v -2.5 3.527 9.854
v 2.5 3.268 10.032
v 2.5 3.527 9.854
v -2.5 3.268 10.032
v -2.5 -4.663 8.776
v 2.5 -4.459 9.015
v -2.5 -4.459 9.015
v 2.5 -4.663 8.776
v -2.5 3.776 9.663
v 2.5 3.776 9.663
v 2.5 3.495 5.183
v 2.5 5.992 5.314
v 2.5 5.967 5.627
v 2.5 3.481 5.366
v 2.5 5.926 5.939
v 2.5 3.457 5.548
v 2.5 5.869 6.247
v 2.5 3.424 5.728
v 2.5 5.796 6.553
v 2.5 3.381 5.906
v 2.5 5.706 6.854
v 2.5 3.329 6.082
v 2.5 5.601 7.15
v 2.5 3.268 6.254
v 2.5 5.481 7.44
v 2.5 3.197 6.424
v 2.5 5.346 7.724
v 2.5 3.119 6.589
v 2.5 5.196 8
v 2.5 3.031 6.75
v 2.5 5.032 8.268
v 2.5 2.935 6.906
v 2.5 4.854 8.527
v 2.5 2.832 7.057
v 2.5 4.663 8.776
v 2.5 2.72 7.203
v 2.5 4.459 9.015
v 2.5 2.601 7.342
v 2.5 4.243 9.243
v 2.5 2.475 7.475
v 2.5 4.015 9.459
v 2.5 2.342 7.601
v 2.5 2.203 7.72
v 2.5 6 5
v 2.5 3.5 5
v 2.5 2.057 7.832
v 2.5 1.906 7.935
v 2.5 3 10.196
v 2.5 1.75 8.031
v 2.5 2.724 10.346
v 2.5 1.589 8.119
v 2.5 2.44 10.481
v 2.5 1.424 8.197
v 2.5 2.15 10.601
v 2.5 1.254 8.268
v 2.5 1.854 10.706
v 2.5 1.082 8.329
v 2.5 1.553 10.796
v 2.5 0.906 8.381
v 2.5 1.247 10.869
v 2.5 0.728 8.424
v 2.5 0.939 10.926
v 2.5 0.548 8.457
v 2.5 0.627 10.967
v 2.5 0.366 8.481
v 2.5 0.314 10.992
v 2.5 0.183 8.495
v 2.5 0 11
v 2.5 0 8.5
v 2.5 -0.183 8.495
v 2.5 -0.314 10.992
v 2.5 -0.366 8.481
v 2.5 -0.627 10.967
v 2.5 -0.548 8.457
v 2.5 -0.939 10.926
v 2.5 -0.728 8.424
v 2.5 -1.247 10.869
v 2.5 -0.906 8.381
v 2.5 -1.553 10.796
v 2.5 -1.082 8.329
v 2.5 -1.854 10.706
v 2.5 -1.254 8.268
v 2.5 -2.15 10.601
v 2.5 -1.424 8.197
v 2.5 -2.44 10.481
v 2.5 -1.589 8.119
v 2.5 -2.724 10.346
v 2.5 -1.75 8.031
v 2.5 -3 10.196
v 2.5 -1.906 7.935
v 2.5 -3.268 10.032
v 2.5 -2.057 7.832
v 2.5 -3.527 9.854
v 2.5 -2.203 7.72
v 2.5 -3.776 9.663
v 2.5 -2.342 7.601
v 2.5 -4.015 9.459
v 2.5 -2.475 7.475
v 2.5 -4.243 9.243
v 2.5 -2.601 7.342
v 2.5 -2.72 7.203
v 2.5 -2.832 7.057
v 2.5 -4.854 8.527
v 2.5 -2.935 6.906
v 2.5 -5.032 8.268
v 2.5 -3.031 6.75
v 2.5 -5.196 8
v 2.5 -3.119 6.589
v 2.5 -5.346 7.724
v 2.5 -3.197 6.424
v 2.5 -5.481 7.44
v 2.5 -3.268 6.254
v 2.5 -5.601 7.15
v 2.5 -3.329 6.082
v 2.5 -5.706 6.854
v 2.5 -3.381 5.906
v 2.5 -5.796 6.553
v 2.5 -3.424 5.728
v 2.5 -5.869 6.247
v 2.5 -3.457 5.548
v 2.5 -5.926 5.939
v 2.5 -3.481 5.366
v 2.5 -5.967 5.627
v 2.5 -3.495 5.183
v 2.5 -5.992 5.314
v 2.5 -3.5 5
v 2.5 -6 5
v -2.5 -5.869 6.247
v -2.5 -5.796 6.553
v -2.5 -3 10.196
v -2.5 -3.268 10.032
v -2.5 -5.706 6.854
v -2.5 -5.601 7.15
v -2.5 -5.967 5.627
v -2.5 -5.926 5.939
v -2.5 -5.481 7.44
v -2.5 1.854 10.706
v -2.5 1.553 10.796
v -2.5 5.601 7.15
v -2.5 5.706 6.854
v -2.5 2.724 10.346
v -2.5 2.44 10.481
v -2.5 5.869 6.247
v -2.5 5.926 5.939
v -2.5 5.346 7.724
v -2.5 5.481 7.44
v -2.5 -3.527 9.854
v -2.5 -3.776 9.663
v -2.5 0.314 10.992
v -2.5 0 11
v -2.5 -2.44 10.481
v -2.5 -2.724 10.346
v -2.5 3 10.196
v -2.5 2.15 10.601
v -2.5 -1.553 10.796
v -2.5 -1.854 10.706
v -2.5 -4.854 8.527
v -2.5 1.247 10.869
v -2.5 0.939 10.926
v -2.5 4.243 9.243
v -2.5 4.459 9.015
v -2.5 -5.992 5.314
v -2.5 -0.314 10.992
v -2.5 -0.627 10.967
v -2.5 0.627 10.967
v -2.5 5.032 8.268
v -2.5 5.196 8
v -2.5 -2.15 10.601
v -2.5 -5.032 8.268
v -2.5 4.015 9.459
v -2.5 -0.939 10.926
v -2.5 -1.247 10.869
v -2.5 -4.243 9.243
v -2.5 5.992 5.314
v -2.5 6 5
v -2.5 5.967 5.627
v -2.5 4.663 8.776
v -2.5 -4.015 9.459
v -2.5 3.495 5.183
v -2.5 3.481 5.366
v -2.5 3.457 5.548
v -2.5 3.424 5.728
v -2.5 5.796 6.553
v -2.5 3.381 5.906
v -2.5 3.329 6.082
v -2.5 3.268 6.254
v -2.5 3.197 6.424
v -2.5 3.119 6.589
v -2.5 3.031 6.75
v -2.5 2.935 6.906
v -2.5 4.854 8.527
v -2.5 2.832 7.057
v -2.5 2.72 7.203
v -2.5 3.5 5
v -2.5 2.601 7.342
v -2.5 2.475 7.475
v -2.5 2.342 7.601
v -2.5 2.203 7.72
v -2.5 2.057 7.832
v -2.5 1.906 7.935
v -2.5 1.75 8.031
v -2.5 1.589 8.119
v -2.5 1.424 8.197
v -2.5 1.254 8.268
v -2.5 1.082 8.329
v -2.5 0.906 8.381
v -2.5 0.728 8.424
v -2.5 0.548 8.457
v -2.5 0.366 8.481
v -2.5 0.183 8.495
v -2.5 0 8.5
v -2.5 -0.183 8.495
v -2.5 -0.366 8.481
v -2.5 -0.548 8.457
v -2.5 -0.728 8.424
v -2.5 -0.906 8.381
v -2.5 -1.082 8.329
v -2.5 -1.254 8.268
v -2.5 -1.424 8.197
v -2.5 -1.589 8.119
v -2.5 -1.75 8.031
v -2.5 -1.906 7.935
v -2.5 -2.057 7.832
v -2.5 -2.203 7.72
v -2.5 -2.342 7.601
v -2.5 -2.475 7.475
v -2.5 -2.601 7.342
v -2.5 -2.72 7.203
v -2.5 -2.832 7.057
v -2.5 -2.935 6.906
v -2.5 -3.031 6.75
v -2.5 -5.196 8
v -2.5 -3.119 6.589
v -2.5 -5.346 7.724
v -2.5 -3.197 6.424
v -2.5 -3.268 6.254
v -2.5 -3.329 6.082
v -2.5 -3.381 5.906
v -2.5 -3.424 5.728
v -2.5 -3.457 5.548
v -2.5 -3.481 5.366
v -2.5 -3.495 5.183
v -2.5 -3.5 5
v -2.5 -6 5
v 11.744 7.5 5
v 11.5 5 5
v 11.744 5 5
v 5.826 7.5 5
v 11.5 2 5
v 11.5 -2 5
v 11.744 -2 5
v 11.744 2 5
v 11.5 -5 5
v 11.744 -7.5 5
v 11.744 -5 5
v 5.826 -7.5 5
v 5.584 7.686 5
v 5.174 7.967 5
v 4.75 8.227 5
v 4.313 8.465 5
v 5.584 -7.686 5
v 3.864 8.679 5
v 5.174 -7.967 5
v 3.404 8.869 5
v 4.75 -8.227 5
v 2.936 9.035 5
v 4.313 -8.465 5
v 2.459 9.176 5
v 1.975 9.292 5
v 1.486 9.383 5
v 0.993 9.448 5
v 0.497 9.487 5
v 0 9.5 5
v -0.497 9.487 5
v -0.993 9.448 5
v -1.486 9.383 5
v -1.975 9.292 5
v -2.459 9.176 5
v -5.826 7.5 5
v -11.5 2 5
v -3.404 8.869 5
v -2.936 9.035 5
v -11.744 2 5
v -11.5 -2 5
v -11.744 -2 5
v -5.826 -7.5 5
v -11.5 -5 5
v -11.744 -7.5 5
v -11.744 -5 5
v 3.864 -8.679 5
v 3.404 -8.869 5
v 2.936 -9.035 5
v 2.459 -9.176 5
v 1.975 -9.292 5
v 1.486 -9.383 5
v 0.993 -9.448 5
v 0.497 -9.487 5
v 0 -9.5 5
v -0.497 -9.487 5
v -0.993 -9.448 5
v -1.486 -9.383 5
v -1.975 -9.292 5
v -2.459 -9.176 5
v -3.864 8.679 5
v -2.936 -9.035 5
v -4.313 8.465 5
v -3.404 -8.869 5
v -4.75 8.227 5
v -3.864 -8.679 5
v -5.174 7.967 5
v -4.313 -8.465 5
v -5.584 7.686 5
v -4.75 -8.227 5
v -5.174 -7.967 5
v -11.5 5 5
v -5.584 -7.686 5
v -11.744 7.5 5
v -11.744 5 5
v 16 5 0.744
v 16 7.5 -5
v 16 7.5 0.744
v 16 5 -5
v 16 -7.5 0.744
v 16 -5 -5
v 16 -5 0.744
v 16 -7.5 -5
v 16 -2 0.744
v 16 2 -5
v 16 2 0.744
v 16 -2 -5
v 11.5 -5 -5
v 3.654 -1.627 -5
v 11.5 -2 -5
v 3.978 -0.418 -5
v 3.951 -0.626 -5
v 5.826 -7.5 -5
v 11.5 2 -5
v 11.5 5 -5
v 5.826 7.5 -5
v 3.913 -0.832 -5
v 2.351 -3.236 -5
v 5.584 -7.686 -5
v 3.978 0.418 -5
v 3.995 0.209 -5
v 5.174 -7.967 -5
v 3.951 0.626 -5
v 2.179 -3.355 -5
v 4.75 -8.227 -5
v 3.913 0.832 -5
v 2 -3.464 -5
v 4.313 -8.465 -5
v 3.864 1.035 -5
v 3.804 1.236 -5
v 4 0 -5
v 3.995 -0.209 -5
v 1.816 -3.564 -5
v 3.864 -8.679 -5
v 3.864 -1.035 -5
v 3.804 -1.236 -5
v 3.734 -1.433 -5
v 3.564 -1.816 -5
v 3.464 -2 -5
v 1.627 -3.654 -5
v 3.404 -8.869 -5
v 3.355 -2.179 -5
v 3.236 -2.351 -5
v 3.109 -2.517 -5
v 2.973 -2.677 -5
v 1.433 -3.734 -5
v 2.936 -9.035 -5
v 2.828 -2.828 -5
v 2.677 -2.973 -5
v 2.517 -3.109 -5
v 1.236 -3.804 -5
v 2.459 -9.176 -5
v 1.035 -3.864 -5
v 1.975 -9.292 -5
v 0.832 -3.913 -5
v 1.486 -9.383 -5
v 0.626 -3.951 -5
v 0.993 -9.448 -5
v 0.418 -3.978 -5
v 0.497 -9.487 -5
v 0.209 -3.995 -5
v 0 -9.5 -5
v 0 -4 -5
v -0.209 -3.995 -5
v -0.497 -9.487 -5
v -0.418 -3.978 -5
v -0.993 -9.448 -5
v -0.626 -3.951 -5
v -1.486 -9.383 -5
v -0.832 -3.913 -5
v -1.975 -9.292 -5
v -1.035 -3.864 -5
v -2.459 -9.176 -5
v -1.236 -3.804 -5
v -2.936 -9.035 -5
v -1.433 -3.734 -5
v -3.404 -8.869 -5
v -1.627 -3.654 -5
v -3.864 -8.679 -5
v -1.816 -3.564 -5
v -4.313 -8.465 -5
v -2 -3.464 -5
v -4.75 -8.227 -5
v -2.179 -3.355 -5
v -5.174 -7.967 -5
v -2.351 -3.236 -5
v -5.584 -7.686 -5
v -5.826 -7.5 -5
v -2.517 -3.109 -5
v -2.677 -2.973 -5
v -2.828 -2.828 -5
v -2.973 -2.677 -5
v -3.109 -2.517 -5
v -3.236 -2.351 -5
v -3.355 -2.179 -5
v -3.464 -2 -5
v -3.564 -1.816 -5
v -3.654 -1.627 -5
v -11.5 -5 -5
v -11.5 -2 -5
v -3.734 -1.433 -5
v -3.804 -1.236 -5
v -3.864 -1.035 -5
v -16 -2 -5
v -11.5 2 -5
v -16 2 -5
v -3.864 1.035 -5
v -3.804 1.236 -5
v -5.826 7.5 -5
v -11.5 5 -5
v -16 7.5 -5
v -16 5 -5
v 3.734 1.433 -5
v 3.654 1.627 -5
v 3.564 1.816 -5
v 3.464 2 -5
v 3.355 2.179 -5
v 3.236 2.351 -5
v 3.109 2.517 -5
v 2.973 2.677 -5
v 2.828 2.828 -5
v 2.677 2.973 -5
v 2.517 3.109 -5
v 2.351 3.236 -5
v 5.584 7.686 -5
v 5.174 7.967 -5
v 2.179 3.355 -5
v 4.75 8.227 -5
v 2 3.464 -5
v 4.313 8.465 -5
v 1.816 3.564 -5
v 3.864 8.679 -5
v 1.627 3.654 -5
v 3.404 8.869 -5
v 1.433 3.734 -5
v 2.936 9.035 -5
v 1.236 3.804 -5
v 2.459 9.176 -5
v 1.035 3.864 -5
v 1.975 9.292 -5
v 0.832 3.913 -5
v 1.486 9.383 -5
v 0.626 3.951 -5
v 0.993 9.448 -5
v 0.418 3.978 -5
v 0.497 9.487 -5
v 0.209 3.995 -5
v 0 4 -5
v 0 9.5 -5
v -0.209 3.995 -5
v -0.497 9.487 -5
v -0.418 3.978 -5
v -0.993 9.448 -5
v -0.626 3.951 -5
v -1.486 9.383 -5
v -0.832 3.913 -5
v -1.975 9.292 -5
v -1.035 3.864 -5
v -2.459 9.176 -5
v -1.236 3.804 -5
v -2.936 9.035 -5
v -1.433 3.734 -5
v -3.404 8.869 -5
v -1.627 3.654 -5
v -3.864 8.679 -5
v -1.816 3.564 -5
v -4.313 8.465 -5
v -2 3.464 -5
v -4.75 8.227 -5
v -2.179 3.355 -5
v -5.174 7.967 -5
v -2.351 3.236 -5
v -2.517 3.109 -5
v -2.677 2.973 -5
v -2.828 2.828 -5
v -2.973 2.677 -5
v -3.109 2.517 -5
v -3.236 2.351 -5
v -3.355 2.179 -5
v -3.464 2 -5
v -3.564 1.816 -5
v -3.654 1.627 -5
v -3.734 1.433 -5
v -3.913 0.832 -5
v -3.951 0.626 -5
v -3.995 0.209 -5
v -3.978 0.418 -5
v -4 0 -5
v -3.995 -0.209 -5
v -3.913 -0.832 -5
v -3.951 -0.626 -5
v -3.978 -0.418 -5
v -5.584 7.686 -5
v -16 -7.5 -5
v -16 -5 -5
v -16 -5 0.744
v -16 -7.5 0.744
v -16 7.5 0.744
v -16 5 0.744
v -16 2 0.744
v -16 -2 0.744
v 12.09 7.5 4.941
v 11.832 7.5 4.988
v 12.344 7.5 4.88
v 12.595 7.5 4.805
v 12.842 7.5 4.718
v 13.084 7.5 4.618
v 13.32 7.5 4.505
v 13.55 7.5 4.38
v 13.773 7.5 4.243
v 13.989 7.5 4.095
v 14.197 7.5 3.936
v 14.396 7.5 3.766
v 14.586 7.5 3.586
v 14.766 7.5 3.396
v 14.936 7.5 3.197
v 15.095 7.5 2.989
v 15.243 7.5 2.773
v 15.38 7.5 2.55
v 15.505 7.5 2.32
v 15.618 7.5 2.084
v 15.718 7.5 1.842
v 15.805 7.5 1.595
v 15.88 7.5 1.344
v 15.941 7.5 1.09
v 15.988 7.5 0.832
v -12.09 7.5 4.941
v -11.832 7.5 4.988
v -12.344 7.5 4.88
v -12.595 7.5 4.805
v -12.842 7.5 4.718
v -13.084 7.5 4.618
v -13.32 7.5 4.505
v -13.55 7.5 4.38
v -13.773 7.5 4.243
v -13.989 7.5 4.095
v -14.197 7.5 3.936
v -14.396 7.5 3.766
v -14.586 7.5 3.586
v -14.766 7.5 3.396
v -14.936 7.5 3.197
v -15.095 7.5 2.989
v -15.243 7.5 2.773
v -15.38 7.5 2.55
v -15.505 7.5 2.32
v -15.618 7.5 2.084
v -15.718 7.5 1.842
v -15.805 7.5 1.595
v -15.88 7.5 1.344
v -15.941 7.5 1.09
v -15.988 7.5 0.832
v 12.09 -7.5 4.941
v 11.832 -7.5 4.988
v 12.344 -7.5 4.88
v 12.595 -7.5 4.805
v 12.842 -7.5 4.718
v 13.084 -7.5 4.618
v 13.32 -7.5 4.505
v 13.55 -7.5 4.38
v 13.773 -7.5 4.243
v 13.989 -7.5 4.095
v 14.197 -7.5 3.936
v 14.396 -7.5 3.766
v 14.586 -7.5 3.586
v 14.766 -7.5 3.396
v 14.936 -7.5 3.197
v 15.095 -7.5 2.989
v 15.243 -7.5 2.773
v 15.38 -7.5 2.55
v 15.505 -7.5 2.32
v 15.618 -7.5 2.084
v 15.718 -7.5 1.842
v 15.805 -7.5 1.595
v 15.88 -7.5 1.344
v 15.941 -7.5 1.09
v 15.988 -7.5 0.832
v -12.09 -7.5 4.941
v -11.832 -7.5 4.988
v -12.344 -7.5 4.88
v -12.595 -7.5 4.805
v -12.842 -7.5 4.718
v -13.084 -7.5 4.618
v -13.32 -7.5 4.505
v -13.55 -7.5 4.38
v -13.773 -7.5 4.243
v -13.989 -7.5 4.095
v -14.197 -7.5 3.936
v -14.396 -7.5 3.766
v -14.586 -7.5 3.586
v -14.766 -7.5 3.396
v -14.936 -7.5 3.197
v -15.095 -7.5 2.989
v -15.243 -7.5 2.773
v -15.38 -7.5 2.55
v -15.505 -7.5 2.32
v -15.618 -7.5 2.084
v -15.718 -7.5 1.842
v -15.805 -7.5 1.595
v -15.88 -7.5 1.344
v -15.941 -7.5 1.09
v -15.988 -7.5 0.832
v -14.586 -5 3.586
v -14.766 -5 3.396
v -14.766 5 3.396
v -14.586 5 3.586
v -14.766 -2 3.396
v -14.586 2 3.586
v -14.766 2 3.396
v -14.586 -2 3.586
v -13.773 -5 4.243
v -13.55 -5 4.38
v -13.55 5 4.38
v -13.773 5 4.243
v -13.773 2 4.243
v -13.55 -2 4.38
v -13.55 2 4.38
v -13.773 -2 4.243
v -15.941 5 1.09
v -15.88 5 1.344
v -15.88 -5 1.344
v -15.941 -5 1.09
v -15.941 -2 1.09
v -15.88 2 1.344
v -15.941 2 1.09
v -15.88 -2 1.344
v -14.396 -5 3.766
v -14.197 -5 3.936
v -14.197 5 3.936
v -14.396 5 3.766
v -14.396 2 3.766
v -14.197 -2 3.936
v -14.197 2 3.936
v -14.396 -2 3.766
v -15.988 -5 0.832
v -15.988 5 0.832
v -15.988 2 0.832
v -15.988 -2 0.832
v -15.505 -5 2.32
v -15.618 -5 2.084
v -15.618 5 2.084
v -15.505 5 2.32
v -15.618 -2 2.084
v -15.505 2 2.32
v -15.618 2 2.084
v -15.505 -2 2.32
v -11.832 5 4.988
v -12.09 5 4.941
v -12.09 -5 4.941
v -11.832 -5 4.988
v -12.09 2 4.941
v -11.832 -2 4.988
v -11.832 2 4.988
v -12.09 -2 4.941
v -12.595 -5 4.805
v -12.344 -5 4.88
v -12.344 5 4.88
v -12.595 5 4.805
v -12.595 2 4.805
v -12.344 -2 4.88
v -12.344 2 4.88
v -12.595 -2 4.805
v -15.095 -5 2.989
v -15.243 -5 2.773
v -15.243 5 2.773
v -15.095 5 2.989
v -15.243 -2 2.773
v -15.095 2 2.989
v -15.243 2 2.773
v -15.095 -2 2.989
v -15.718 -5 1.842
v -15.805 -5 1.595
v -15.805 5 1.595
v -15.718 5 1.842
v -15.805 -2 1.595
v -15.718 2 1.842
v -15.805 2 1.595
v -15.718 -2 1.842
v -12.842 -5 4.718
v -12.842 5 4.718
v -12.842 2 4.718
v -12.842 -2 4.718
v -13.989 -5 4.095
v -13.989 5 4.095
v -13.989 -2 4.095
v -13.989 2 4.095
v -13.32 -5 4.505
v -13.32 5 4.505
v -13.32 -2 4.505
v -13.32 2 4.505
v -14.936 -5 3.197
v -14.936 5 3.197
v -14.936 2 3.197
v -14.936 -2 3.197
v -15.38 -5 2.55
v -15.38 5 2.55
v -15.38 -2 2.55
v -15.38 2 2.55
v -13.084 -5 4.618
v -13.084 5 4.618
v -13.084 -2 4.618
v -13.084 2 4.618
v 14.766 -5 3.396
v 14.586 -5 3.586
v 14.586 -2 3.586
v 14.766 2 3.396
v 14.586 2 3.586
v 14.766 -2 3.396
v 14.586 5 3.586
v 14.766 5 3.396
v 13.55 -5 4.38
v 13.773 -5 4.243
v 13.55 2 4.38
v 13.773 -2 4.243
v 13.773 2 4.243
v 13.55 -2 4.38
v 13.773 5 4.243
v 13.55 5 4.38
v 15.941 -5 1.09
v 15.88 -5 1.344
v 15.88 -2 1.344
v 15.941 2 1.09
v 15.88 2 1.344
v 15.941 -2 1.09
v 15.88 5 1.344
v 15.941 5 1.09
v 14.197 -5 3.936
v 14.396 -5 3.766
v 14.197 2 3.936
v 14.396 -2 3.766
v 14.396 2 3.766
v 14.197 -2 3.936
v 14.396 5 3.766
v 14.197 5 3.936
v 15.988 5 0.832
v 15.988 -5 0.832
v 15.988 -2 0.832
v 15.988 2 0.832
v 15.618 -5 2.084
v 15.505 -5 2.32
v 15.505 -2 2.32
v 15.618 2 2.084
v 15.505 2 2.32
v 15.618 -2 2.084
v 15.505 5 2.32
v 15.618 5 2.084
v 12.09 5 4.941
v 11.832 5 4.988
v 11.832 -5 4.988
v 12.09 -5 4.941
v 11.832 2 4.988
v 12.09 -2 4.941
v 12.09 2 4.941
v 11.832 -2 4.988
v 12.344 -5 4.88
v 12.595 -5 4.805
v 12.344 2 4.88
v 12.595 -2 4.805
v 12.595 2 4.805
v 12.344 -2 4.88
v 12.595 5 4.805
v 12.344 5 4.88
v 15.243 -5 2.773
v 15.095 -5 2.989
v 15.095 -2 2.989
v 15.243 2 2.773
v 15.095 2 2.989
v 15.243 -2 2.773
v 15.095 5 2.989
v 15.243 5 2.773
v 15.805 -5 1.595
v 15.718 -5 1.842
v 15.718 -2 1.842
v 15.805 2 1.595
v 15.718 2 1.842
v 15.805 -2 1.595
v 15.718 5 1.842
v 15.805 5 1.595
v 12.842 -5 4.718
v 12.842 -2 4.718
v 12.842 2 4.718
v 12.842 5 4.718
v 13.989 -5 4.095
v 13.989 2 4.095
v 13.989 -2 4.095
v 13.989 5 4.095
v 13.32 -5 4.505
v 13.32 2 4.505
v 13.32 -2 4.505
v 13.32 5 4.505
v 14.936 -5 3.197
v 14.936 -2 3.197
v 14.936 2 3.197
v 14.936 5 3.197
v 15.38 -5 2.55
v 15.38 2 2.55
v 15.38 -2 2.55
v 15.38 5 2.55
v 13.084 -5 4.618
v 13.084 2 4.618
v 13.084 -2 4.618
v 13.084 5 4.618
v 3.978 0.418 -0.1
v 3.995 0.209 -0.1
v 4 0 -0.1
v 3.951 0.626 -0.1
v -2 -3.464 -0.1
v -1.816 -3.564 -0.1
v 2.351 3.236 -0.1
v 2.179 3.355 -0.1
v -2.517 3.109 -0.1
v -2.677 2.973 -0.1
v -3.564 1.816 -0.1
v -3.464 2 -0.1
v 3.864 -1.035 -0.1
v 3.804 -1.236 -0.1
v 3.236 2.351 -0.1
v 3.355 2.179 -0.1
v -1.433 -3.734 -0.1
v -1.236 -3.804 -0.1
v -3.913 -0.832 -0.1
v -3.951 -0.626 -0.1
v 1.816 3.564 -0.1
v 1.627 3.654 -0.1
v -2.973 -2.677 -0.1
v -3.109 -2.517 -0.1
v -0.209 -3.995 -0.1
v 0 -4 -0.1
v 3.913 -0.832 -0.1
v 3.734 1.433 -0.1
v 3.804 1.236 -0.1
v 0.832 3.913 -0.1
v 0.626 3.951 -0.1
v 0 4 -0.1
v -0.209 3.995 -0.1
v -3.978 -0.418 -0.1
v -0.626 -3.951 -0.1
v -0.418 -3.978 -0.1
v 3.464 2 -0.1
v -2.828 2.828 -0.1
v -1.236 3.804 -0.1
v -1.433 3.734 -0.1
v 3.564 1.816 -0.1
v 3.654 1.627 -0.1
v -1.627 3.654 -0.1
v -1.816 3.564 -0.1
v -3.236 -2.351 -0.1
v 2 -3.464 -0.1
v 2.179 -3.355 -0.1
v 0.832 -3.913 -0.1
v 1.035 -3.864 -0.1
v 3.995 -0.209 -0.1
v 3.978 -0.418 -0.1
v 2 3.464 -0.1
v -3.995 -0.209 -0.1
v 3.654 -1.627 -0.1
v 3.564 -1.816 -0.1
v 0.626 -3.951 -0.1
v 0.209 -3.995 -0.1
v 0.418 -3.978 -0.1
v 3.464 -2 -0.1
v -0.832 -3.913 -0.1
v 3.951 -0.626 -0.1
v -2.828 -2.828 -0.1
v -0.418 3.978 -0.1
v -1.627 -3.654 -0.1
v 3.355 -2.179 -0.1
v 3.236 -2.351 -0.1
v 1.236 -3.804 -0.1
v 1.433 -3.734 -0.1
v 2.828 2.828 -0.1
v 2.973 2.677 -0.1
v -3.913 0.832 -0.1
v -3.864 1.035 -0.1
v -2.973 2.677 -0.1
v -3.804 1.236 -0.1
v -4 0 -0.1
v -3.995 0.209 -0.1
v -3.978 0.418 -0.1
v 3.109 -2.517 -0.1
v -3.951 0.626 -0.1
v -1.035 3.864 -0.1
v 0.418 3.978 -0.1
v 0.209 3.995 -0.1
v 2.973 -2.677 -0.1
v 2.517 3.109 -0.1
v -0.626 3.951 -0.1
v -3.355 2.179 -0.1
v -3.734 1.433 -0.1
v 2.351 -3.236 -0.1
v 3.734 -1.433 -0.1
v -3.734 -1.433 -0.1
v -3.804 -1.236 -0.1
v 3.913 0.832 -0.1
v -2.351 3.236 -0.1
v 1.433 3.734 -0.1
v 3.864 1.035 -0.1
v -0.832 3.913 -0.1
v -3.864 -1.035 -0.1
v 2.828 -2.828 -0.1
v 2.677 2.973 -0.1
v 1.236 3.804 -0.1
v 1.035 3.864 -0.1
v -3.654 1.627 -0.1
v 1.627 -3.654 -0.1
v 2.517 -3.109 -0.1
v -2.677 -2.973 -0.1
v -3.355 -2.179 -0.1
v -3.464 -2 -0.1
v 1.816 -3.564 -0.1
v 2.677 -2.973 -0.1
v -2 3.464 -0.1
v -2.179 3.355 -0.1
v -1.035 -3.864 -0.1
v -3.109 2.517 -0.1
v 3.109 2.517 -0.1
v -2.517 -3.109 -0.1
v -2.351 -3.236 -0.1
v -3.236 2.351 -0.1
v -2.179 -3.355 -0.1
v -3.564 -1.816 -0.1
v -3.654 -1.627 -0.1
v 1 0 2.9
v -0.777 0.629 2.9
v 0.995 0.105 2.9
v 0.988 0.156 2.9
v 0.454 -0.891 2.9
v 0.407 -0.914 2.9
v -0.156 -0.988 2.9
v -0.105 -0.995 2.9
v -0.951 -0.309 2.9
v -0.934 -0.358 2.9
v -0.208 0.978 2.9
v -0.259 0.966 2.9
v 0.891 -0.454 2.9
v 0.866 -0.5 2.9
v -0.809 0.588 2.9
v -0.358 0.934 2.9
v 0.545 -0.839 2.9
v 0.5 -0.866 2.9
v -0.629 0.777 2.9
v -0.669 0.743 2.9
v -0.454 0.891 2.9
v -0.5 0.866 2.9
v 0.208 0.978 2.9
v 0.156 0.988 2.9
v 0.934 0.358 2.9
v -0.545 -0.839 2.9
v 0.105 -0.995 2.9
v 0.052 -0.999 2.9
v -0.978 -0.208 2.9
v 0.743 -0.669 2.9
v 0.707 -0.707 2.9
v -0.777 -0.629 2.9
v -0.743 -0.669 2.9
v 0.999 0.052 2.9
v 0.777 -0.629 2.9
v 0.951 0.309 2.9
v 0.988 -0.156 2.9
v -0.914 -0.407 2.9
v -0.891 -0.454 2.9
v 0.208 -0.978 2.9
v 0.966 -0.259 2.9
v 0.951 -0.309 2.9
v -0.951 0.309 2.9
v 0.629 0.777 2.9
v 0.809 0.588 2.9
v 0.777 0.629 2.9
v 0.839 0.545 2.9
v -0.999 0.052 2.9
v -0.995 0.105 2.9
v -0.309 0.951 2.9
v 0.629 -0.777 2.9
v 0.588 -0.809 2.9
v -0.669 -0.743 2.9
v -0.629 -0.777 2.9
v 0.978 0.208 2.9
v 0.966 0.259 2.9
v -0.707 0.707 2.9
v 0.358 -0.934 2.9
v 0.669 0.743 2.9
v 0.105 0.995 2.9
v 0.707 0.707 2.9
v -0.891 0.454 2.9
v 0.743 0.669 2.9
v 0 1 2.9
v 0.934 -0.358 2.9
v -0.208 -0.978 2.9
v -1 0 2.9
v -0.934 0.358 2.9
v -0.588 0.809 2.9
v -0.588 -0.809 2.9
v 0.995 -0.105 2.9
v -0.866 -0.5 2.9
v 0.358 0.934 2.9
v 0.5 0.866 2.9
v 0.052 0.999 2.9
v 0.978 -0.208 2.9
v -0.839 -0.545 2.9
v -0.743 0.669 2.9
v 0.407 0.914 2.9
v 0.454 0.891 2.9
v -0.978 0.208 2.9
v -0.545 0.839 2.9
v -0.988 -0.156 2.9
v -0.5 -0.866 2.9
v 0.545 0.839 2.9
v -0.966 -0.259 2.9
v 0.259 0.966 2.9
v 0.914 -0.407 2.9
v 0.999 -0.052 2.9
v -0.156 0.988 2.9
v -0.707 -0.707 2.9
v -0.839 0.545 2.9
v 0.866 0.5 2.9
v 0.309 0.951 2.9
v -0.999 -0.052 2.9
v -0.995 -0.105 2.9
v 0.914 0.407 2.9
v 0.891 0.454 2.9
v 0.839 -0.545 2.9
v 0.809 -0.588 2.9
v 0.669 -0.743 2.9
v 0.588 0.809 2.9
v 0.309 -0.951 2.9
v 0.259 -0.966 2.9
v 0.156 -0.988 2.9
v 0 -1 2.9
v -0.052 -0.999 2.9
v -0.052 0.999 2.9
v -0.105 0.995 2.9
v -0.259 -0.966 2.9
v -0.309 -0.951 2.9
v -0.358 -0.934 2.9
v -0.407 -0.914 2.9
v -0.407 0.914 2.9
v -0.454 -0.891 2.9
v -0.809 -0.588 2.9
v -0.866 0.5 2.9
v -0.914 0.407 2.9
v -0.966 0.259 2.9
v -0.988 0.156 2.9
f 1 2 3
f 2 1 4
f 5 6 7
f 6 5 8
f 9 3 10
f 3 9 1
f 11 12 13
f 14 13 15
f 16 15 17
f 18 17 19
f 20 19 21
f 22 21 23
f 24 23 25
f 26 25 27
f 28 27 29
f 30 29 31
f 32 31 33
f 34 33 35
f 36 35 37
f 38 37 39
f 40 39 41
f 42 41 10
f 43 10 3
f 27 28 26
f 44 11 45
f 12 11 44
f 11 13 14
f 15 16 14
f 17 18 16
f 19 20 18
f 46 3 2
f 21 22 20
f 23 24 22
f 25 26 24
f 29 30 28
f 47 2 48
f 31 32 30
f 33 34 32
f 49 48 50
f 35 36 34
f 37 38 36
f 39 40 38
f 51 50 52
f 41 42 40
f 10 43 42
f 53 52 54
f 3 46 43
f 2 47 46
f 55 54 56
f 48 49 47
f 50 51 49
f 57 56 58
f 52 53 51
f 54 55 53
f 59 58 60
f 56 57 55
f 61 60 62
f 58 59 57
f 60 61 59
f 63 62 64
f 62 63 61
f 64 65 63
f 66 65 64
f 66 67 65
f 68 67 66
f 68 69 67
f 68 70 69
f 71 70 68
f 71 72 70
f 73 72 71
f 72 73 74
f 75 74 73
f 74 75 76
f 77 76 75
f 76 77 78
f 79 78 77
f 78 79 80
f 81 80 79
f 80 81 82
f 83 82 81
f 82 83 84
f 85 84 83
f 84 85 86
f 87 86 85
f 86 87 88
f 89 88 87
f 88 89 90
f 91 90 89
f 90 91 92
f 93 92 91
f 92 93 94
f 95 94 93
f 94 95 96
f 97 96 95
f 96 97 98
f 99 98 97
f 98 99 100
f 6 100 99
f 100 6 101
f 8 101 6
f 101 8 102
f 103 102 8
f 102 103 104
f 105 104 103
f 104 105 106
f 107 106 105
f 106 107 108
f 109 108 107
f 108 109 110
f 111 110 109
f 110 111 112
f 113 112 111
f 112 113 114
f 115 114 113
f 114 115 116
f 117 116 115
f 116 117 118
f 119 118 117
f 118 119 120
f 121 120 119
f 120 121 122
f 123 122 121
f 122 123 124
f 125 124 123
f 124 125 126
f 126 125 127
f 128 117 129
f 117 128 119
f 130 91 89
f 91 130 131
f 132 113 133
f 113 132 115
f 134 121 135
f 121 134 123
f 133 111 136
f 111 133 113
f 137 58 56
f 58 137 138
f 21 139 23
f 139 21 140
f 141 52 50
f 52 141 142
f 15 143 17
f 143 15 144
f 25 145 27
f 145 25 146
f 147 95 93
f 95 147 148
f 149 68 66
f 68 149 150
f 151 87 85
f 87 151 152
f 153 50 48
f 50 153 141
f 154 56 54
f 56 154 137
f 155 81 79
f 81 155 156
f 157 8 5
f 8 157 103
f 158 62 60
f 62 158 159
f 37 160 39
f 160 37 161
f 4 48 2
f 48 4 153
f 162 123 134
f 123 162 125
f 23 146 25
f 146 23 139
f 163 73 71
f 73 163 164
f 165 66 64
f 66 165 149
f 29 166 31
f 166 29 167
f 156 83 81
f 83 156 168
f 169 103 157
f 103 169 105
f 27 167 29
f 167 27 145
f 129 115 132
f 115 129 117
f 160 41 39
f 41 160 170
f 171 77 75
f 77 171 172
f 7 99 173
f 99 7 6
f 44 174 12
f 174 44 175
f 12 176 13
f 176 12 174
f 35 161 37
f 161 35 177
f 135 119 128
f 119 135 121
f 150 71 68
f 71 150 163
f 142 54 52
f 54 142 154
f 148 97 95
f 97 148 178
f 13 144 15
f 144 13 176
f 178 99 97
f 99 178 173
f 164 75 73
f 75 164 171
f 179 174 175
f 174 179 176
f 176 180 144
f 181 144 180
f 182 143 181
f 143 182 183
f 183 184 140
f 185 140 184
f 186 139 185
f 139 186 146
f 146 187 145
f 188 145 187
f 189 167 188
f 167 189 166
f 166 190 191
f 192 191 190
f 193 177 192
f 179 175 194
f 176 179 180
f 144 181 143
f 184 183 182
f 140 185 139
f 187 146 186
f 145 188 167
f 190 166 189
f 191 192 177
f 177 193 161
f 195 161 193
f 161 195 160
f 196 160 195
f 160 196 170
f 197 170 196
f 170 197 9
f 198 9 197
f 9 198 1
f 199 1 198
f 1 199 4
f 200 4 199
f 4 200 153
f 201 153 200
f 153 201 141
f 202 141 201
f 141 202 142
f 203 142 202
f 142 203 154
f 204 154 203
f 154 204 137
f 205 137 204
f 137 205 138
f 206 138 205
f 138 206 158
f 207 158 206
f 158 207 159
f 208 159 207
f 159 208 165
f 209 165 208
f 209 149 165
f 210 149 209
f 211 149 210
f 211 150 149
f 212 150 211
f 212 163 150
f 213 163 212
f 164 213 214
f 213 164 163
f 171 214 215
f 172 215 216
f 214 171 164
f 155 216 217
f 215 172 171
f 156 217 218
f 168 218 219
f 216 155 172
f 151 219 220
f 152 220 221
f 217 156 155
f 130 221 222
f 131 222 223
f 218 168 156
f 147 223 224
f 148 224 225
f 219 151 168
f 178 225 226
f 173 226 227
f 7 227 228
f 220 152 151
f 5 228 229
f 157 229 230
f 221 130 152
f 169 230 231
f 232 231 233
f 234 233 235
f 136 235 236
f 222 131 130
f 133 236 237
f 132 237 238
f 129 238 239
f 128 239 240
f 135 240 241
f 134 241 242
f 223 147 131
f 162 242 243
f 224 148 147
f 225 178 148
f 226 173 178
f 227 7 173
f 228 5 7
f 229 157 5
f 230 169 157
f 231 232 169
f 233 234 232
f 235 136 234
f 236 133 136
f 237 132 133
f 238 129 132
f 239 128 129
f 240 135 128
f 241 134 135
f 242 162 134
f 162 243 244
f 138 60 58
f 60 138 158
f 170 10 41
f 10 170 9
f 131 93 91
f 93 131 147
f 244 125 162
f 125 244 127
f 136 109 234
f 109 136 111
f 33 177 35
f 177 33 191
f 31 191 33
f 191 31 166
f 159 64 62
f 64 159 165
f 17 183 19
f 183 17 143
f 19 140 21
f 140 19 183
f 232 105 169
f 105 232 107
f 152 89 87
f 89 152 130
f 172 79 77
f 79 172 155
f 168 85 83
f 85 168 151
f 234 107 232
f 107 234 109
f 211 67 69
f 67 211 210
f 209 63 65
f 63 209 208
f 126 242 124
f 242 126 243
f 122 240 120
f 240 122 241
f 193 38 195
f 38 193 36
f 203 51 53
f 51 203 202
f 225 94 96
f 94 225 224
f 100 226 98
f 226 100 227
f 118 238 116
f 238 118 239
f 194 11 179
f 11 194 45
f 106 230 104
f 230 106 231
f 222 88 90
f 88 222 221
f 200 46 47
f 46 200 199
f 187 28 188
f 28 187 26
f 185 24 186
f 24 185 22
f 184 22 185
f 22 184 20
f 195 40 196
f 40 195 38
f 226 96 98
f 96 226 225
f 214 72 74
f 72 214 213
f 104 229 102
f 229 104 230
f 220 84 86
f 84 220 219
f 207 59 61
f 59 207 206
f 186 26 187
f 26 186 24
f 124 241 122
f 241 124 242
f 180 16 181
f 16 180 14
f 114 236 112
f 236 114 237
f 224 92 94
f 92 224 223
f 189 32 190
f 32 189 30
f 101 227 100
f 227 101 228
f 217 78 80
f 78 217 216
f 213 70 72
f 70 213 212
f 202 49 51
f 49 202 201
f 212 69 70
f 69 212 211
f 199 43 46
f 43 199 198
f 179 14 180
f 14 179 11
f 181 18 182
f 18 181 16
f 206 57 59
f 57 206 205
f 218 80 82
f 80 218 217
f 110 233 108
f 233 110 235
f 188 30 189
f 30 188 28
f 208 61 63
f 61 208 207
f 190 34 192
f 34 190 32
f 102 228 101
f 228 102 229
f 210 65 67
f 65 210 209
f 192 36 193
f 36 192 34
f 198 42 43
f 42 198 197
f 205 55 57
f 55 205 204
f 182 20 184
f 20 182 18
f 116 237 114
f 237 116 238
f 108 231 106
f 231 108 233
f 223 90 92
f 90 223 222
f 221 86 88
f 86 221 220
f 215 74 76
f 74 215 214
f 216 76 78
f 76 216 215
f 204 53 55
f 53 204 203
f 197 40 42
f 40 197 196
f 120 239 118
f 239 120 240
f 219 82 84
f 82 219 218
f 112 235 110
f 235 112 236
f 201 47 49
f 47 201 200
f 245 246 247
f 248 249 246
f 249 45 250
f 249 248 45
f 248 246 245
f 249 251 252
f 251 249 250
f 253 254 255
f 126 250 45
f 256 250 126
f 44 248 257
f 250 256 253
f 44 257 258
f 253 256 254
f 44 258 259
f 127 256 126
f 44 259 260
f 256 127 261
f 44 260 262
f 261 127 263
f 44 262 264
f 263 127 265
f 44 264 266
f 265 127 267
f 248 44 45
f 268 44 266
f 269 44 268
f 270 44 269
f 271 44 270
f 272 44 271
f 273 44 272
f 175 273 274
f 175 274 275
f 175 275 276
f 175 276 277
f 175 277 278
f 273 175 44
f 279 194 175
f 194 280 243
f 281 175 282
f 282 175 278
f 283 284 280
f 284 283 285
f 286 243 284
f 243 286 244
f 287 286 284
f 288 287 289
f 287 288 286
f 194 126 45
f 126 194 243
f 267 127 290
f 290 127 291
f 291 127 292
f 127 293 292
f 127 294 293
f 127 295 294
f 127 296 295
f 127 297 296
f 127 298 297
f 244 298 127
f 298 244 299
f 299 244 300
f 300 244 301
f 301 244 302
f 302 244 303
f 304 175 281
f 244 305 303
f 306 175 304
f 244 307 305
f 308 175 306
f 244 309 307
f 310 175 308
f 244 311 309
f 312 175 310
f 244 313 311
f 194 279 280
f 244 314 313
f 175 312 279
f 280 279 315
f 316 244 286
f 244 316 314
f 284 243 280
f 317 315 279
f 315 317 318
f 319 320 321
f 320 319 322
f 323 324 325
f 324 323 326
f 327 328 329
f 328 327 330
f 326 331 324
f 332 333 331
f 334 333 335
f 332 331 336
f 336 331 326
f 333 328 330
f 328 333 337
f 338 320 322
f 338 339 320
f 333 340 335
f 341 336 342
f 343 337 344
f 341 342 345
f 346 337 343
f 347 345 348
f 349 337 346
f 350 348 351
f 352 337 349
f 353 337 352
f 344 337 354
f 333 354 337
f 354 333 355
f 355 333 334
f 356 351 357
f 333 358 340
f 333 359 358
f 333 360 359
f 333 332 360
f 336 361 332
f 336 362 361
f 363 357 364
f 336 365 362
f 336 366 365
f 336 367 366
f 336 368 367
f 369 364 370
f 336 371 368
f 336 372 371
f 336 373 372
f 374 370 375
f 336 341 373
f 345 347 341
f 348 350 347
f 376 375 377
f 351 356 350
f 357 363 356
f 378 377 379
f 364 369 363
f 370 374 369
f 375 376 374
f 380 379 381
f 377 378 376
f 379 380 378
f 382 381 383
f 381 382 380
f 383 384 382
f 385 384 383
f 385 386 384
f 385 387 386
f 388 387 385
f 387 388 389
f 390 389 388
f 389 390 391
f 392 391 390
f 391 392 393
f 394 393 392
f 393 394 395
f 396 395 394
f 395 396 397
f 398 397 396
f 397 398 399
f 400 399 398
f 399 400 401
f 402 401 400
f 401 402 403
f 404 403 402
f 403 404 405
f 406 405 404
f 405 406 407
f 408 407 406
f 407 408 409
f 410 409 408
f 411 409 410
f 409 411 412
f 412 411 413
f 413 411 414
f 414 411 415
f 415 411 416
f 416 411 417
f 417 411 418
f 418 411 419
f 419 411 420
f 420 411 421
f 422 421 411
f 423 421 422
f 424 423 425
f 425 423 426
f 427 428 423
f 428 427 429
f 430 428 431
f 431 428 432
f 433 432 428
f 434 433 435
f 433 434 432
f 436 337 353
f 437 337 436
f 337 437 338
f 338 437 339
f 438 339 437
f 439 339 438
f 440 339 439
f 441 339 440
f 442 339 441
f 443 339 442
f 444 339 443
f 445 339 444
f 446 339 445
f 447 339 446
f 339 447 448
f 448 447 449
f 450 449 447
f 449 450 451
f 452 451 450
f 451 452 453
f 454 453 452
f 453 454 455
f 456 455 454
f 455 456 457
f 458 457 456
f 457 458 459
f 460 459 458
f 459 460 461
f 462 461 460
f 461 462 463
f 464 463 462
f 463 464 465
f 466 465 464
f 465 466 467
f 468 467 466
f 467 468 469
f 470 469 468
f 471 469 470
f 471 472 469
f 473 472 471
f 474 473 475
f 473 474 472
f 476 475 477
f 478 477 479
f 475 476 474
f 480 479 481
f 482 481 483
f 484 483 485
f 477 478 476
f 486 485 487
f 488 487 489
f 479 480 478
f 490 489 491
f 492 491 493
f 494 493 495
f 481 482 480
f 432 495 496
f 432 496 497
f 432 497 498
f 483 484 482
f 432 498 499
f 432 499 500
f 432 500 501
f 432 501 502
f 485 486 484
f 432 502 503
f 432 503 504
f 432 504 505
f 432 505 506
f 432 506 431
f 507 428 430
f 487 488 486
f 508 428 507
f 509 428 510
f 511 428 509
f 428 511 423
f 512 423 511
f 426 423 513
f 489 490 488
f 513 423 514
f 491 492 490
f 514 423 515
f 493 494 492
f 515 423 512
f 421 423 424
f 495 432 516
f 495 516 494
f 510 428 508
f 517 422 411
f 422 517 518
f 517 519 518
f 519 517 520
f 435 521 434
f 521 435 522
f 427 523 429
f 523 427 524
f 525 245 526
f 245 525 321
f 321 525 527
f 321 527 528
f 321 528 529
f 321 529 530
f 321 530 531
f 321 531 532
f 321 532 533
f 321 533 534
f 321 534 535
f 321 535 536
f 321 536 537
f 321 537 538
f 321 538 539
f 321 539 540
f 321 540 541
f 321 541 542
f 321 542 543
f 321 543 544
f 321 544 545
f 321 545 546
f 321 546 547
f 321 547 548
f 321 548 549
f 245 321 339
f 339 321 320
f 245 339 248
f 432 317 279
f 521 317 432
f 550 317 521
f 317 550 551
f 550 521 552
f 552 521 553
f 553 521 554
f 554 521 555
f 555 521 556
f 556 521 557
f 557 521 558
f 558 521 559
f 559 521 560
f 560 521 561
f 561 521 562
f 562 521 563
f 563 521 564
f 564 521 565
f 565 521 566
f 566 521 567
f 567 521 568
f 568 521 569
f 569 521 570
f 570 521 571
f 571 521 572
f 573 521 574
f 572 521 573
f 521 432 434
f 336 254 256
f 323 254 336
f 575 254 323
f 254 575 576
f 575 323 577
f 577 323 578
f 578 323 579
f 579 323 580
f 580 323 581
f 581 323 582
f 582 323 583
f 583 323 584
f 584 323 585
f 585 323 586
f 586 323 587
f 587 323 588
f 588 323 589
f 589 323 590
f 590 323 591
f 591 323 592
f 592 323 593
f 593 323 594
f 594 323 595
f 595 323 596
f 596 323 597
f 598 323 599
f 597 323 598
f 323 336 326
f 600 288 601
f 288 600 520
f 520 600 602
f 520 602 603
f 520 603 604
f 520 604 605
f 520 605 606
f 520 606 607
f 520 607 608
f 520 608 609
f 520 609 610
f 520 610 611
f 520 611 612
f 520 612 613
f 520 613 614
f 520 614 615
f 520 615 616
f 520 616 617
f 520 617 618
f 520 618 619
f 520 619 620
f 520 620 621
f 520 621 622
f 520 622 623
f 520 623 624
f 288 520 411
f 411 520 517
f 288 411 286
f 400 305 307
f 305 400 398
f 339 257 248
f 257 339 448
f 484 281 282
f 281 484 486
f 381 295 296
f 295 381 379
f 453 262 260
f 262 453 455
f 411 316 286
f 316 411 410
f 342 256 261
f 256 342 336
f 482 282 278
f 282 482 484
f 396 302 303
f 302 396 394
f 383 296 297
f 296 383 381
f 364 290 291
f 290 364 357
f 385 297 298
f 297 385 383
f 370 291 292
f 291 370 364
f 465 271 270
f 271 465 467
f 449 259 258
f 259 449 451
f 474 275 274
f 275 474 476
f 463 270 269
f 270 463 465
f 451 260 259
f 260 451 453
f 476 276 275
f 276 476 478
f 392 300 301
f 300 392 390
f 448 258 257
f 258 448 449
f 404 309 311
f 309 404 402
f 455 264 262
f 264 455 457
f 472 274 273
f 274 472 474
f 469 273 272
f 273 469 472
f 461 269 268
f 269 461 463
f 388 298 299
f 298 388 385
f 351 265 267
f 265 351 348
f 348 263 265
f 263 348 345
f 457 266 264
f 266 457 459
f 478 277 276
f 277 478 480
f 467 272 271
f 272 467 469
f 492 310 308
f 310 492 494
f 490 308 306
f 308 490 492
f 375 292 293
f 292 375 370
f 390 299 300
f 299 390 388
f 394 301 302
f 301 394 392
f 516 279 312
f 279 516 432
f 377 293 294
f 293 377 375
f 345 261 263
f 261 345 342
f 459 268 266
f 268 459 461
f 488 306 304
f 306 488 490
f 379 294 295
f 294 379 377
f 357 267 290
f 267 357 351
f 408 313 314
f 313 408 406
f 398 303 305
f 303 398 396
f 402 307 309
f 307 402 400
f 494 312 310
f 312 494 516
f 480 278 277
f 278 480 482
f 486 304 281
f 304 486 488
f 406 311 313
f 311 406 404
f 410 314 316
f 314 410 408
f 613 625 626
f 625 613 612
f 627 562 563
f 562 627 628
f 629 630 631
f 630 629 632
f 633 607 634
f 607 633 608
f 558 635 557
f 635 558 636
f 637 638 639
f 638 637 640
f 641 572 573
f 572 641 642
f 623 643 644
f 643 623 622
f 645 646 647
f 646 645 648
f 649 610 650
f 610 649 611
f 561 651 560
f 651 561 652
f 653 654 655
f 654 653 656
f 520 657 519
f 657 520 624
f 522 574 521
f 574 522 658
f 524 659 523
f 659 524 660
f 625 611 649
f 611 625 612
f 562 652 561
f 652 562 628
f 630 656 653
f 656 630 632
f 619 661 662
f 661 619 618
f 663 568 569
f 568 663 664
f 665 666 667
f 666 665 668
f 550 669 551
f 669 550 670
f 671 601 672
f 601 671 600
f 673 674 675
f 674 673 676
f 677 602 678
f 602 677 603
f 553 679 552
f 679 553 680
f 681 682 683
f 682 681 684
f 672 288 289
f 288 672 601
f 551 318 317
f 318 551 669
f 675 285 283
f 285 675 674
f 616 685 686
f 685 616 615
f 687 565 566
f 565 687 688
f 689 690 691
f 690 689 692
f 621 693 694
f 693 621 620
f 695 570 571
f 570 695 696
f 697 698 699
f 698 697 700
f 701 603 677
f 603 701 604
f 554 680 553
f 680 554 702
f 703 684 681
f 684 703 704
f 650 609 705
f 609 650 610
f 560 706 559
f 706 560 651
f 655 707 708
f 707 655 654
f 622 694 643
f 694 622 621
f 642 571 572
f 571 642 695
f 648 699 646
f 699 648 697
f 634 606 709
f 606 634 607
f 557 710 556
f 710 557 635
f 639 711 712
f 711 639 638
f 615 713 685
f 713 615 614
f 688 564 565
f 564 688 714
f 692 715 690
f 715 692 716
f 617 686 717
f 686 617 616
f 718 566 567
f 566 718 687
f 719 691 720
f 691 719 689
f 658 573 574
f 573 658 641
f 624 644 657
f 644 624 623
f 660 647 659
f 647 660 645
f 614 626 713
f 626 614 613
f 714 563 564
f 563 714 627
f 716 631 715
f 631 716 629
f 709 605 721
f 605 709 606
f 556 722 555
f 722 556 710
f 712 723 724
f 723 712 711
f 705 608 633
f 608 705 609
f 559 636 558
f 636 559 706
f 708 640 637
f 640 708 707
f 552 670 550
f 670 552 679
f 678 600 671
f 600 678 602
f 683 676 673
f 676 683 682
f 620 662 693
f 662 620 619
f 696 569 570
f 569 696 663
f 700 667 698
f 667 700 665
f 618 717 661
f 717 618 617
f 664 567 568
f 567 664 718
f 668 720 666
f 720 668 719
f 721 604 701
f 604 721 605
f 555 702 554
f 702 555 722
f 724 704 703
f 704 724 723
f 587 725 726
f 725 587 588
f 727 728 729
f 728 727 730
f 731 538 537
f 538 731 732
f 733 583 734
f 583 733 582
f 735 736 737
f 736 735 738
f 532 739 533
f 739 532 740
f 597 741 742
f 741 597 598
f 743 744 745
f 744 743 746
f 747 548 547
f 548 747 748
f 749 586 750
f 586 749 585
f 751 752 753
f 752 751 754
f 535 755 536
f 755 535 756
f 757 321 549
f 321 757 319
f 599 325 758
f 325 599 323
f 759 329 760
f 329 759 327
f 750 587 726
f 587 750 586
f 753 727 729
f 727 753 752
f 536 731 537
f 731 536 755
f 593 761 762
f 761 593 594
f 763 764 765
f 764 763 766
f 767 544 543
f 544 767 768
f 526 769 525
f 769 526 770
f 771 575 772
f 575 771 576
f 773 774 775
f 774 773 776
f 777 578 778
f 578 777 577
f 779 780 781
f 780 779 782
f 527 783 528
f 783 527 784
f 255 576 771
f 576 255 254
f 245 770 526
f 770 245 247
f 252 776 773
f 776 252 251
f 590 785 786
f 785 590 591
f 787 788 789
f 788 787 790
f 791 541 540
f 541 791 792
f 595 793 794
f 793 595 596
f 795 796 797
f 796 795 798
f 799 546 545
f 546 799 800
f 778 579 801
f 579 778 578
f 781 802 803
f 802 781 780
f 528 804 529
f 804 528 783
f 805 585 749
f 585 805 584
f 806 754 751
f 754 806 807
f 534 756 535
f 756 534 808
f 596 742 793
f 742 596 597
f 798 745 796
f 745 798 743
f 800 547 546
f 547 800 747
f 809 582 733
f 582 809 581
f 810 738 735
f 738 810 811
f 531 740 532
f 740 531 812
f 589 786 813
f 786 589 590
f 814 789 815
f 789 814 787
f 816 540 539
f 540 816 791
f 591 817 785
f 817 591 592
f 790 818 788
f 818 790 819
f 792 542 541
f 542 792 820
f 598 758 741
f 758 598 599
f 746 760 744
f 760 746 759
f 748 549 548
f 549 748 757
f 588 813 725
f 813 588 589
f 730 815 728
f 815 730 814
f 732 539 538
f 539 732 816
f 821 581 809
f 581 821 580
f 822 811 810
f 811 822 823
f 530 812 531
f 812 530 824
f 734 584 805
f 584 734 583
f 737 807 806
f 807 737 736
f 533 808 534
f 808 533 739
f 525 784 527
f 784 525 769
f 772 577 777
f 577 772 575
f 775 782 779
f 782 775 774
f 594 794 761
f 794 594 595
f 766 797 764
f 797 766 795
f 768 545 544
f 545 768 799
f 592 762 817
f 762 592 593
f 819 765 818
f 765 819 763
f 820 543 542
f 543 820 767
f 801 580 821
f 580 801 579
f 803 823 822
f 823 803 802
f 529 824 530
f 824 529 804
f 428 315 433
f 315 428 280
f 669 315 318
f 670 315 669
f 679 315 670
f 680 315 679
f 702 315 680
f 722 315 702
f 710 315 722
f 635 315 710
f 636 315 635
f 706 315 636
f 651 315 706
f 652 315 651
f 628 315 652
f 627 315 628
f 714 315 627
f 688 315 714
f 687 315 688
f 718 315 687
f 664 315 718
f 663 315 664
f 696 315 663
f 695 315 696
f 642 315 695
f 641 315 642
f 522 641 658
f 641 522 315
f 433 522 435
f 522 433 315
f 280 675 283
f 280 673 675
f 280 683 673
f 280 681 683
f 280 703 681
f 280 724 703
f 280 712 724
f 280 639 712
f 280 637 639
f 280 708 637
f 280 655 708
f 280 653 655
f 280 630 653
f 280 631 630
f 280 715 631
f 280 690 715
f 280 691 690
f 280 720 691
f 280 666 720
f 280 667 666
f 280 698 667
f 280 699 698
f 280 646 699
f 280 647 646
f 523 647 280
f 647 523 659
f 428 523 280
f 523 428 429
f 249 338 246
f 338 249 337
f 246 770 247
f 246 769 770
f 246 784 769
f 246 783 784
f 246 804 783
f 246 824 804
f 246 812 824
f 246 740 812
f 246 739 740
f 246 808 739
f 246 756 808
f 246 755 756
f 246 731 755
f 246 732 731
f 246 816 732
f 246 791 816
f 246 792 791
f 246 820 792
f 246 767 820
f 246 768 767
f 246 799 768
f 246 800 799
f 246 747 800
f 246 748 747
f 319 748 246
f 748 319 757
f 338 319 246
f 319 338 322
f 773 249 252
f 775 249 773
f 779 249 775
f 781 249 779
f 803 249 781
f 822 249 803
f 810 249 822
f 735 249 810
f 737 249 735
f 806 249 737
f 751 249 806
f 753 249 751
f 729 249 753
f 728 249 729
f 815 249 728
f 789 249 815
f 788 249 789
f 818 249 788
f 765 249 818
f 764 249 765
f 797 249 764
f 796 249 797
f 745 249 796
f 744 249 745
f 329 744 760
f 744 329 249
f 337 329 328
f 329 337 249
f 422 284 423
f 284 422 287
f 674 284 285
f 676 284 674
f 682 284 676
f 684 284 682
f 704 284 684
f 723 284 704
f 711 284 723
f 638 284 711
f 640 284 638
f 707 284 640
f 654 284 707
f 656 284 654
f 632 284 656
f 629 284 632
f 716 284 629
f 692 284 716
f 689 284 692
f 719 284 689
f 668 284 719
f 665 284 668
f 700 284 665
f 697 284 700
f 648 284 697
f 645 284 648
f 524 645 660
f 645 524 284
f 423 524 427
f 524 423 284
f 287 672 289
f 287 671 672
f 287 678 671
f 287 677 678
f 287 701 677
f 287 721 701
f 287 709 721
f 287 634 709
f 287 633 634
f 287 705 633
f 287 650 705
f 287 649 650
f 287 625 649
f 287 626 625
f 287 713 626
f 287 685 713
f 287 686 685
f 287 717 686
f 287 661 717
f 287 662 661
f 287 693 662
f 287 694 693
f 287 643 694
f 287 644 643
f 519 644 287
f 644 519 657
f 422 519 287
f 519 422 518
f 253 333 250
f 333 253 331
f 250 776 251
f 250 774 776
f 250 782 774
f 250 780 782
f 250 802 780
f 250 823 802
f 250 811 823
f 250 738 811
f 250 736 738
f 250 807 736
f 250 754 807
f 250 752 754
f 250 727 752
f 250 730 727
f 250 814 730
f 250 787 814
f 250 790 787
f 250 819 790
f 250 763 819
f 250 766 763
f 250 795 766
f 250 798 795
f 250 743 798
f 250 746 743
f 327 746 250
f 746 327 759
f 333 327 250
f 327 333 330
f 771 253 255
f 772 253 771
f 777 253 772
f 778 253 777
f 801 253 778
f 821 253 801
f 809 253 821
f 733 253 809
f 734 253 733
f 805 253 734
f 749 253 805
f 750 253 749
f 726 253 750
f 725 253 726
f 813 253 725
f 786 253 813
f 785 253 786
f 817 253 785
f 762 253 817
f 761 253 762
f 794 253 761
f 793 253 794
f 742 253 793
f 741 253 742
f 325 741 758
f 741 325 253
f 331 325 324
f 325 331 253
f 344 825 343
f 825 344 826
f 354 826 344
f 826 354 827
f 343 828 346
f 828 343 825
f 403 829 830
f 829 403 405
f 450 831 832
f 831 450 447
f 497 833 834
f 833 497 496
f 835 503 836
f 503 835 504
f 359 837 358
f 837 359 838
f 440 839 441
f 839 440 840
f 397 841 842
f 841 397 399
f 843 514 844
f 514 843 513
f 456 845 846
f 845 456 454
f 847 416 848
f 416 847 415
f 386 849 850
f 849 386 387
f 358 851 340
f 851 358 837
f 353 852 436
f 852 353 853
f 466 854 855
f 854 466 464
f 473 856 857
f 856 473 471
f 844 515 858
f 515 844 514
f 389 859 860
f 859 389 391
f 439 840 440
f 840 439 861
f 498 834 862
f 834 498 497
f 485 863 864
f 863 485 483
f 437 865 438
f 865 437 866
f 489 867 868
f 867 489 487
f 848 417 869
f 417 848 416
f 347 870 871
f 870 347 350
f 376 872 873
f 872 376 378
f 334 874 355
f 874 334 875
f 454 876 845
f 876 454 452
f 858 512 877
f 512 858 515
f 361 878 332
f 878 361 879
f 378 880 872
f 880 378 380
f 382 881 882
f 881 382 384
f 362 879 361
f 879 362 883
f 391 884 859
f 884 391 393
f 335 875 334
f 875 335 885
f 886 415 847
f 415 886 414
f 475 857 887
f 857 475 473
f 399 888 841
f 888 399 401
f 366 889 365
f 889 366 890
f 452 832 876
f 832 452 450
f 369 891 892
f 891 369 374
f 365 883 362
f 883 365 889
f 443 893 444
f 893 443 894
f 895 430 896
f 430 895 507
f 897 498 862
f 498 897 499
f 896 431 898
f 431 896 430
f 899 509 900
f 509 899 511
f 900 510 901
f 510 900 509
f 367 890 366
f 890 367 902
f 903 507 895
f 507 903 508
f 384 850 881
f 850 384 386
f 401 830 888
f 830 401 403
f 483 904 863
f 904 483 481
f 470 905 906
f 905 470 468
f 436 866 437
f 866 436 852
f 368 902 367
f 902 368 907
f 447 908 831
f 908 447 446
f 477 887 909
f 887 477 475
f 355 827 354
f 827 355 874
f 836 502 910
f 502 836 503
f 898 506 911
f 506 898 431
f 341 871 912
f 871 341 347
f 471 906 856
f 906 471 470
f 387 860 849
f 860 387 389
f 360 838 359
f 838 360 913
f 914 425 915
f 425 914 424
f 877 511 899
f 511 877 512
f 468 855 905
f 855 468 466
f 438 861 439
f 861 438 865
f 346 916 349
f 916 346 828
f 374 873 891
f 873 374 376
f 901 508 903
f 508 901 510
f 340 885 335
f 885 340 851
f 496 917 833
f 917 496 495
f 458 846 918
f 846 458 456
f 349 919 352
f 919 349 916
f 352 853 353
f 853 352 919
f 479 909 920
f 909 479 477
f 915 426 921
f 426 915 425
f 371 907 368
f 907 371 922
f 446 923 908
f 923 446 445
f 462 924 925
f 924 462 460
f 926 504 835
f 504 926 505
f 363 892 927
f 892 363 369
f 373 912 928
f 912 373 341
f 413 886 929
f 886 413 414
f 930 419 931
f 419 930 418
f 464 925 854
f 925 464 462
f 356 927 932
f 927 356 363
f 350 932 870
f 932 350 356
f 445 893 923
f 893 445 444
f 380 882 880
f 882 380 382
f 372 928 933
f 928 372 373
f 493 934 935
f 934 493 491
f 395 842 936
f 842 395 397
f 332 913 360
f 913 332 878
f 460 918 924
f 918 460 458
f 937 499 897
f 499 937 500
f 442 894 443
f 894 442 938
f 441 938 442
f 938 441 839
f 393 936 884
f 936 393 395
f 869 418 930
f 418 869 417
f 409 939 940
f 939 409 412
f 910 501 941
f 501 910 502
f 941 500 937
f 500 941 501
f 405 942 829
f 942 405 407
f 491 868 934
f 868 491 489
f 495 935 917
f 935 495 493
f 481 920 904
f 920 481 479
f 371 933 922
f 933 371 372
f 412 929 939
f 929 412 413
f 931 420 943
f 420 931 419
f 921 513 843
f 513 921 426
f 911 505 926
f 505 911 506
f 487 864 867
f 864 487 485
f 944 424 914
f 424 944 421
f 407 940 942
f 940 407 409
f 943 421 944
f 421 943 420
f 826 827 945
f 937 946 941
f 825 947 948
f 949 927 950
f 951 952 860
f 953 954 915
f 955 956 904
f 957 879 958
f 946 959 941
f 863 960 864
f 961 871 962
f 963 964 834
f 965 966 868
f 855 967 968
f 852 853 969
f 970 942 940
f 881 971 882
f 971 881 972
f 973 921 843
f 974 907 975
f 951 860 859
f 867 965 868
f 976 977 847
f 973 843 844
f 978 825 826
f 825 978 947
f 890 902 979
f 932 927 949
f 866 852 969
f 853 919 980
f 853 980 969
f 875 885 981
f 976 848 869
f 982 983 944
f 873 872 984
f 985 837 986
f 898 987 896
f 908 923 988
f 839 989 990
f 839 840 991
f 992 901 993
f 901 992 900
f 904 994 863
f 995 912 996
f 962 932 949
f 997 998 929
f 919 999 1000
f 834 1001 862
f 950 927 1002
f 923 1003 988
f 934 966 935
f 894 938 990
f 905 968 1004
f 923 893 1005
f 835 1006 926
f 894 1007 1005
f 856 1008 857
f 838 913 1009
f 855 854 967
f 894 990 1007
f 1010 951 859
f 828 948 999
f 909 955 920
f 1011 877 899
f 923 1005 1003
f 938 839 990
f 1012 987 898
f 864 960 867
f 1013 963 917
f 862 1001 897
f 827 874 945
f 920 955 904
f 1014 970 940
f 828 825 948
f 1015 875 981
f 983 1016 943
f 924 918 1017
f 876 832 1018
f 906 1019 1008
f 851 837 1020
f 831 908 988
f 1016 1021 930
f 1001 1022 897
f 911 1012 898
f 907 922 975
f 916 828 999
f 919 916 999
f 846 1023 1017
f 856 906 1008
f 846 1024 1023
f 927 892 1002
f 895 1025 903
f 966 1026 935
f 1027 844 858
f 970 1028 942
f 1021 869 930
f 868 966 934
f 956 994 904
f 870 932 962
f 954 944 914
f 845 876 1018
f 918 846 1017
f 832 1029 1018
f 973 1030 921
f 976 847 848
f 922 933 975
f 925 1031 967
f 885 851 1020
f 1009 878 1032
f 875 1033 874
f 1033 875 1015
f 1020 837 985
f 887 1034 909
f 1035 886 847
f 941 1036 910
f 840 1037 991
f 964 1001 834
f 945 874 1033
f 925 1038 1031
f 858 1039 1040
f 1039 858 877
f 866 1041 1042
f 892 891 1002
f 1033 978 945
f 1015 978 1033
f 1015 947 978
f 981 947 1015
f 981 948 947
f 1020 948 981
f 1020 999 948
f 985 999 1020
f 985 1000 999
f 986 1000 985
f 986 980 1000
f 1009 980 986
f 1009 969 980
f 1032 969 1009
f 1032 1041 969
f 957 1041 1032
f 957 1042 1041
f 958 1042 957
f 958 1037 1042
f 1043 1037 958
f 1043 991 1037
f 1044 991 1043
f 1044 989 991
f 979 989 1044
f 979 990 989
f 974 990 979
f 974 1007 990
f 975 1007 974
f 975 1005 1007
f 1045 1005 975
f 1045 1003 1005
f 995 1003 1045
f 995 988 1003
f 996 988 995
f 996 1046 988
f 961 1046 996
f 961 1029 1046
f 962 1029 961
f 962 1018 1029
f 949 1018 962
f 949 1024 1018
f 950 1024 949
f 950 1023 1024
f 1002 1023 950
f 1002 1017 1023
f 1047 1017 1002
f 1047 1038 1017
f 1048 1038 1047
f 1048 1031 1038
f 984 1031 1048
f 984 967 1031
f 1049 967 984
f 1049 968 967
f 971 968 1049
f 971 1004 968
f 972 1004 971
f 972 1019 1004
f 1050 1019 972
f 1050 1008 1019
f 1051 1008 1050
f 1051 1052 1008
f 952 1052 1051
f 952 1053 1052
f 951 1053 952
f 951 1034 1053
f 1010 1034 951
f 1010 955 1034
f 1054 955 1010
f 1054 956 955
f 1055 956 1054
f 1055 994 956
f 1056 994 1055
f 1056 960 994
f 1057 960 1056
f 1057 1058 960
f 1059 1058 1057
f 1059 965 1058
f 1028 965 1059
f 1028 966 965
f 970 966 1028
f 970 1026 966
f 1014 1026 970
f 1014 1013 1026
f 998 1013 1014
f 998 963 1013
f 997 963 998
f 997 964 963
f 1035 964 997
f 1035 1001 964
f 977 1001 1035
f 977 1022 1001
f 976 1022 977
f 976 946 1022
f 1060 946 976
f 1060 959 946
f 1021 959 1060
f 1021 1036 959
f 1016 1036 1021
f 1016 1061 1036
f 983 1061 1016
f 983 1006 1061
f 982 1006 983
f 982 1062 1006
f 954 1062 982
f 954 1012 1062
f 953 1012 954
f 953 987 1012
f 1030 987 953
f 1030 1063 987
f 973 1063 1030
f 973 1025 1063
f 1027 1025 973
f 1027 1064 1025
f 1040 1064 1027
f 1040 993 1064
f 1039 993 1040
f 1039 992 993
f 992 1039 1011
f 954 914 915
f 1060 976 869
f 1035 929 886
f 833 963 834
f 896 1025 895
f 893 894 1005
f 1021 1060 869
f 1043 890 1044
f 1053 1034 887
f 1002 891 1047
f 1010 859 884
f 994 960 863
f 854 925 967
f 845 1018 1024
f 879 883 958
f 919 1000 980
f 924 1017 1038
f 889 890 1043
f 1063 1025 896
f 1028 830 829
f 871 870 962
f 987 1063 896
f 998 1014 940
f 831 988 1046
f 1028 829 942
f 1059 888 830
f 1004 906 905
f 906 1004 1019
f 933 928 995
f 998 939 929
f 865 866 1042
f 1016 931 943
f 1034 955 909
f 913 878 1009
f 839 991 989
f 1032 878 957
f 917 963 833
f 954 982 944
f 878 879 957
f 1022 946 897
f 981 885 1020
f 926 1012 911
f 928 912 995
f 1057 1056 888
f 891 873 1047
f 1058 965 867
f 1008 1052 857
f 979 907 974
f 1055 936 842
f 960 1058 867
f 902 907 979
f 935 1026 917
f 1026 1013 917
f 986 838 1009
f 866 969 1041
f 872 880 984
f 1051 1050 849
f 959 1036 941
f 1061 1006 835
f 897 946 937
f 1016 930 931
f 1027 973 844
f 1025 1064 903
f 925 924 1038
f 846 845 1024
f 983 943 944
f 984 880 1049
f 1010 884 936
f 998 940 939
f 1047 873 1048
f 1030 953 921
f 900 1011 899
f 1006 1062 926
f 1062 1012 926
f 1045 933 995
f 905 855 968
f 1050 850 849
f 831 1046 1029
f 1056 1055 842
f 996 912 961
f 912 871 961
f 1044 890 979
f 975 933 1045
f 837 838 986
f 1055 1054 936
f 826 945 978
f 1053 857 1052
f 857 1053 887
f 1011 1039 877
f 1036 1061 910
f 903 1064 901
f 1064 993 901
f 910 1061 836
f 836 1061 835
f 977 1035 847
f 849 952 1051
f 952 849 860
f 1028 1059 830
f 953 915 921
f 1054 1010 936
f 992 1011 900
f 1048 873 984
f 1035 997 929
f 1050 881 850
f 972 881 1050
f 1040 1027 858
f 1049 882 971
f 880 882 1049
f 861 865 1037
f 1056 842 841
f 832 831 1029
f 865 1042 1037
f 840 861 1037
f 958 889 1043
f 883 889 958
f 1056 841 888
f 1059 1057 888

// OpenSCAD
pen_diameter = 8;

$fn = 120;

bracket();

module bracket() {
	difference() {
		union() {
			cube([32, 15, 10], center=true);
			cylinder(h = 10, r=9.5, center=true);
			translate([0, 0, 5]) loop();
			}
            
		// Slots to catch elastic
		translate([-14, 3.5, 0]) color([1, 0, 0])cube([5, 3, 13], center=true);
		translate([ 14, 3.5, 0]) color([1, 0, 0])cube([5, 3, 13], center=true);
		translate([-14,-3.5, 0]) color([1, 0, 0])cube([5, 3, 13], center=true);
		translate([ 14,-3.5, 0]) color([1, 0, 0])cube([5, 3, 13], center=true);

		// hole for pen
		translate([0, 0, -2.6])cylinder(h=5, r= pen_diameter/2, center=true);
		translate([0, 0, 1.4])cylinder(h=3, r2=1, r1= pen_diameter/2, center=true);

		// round chamfer on top
		translate([-11.05, 0, 0.05]) color([0, 0.5, 0])curve();
		translate([11.05, 0, 0.05]) color([0, 0.5, 0])mirror() curve();

	}
}

module loop() {
	difference() {
		rotate([0, 90, 0]) cylinder(r= 6, h=5, center=true);
		translate([-0.5, 0, 0]) rotate([0, 90, 0]) cylinder(r= 3.5, h=7, center=true);
		translate([0, 0, -3 ])cube([6, 10, 6], center = true);
	}
}

module curve(rad=10, height = 20) {
	difference() {
		translate([-rad/4, 0,  rad/4])cube([rad/2, height, rad/2], center = true);
		rotate([90, 0, 0])cylinder(r=rad/2, h=height + 1, center=true);
	}
}
